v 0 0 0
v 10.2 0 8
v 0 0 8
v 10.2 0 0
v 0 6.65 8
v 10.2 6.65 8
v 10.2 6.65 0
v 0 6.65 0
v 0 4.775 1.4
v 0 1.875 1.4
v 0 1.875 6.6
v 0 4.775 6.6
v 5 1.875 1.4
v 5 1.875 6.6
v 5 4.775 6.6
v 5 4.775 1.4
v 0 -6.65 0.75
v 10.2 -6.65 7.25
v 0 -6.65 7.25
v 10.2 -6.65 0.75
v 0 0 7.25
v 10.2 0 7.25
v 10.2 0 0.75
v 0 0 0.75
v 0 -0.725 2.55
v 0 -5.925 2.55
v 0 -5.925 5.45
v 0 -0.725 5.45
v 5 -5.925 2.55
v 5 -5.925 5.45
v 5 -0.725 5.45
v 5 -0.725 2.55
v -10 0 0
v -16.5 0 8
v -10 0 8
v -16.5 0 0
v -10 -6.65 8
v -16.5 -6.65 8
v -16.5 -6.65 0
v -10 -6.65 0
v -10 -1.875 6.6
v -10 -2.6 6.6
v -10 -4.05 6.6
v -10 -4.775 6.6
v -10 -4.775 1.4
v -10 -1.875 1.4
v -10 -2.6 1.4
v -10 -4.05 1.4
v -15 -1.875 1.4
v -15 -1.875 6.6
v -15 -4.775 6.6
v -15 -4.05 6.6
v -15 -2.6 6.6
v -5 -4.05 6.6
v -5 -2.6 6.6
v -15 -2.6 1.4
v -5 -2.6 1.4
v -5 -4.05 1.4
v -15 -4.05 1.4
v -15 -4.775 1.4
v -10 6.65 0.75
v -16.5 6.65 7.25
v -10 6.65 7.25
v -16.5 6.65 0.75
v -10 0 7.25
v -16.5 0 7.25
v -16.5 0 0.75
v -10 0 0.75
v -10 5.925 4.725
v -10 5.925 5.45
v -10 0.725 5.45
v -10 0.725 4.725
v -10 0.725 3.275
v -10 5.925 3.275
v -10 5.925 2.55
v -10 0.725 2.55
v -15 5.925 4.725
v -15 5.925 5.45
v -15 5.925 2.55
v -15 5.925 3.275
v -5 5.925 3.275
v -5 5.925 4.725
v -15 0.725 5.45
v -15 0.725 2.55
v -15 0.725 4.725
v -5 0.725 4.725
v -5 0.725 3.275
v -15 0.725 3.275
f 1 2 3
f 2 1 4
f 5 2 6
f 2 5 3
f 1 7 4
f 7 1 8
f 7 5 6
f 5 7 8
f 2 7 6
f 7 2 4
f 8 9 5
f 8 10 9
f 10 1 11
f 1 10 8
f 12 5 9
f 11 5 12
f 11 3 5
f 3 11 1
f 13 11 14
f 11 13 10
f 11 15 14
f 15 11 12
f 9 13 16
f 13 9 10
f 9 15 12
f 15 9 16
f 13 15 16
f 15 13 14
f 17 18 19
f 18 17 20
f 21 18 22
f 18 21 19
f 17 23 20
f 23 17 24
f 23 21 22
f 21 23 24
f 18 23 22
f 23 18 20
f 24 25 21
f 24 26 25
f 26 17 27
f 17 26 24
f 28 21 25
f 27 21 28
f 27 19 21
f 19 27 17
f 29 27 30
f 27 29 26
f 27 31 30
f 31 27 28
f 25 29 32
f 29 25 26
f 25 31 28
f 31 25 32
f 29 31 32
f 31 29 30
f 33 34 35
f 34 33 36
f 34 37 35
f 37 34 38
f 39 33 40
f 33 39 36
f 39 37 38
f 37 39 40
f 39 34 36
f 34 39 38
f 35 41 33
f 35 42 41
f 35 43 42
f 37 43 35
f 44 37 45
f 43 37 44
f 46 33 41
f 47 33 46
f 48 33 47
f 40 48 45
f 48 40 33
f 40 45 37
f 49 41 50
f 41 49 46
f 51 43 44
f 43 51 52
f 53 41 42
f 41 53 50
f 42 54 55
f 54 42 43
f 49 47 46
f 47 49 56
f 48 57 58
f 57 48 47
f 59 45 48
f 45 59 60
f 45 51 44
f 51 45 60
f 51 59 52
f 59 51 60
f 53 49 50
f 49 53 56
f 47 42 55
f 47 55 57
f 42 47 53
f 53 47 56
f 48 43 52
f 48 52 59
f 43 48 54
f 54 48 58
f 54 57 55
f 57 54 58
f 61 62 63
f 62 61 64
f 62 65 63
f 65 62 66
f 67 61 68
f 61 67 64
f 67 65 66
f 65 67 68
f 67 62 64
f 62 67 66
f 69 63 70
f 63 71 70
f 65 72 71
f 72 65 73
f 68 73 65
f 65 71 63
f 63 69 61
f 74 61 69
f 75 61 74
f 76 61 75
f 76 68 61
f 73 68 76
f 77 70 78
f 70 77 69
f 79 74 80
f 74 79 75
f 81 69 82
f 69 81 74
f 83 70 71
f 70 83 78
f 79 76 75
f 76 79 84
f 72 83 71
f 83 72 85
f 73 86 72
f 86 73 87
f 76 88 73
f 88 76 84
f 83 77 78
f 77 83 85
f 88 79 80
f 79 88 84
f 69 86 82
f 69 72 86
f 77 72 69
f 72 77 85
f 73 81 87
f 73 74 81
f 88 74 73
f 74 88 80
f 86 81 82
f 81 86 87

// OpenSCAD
/**
  * Module: T-Plug placeholders
  *
  * Author: Karim Aziiev <karim.aziiev@gmail.com>
  * License: GPL-3.0-or-later
  */

include <../colors.scad>

use <../lib/shapes3d.scad>
use <../lib/transforms.scad>

t_plug_body_w         = 13.3;
t_plug_body_size      = [13.3, 10.2, 8.0, 6.5]; // width, length, plus height, minus height
t_plug_plus_body_size = [t_plug_body_w / 2, 7.6, 8.0];

t_plug_depth          = 5;

t_plug_hole_l         = 5.2;
t_plug_hole_w         = 2.9;

t_plug_male_body_l    = 6.5;

t_plug_male_body_size = [t_plug_body_size[0],
                         t_plug_male_body_l,
                         t_plug_body_size[2],
                         t_plug_body_size[3]];

module t_plug_female(body_size=t_plug_body_size,
                     color="#96484D",
                     t_plug_depth=t_plug_depth,
                     t_plug_hole_w=t_plug_hole_w,
                     t_plug_hole_l=t_plug_hole_l,
                     anchor=[0, 0, 1],
                     spin,
                     orientation="wlh") {
  w = body_size[0] / 2;
  plus_h = body_size[2];
  minus_h = body_size[3];
  plus_body_size = [w, body_size[1], plus_h];
  minus_body_size = [w, body_size[1], minus_h];

  with_orientation(from="wlh",
                   to=orientation,
                   anchor=anchor,
                   size=[body_size[0], body_size[1], max(plus_h, minus_h)],
                   spin=spin) {
    translate([0, -body_size[1] / 2, 0]) {
      translate([-plus_body_size[0] / 2, 0, plus_h / 2]) {

        difference() {
          cuboid(size=plus_body_size, anchor=[0, 1, 0], color=color);
          translate([0, -0.1, 0]) {
            cuboid(size=[t_plug_hole_w, t_plug_depth + 0.1, t_plug_hole_l],
                   anchor=[0, 1, 0]);
          }
        }
        if ($children > 0) {
          children(0);
        }
      }

      translate([minus_body_size[0] / 2, 0, plus_h / 2]) {
        difference() {
          cuboid(size=minus_body_size, anchor=[0, 1, 0], color=color);
          translate([0, -0.1, 0]) {
            cuboid(size=[t_plug_hole_l, t_plug_depth + 0.1, t_plug_hole_w],
                   anchor=[0, 1, 0]);
          }
        }
        if ($children > 1) {
          children(1);
        }
      }
    }
  }
}

module t_plug_male(body_size=t_plug_male_body_size,
                   color="#96484D",
                   t_plug_depth=t_plug_depth,
                   t_plug_hole_w=t_plug_hole_w,
                   t_plug_hole_l=t_plug_hole_l,
                   anchor=[0, 0, 1],
                   spin,
                   orientation="wlh") {
  t_plug_female(orientation=orientation,
                body_size=body_size,
                spin=spin,
                anchor=anchor,
                color=color,
                t_plug_depth=t_plug_depth,
                t_plug_hole_w=t_plug_hole_w,
                t_plug_hole_l=t_plug_hole_l) {
    cuboid(size=[t_plug_hole_w / 2, t_plug_depth * 2, t_plug_hole_l],
           anchor=[0, 0, 0],
           color=metallic_gold_2);
    cuboid(size=[t_plug_hole_l, t_plug_depth * 2, t_plug_hole_w / 2],
           anchor=[0, 0, 0],
           color=metallic_gold_2);
  }
}

t_plug_female(orientation="lwh", anchor=[1, 0, 1], spin=180);

translate([-10, 0, 0]) {
  t_plug_male(orientation="lwh", anchor=[-1, 0, 1]);
}
/**
  ─────────────────────────────────────────────────────────────────────────────
  t_plug_mated_props
  ─────────────────────────────────────────────────────────────────────────────
  Return mating and solder datums for the default keyed connector pair.
  **Returns:** Female body on +Y, male body on -Y, mating plane Y=0 and
  bottom Z=0. Ports are ordered positive, negative, in both halves.
 */
function t_plug_mated_props() =
  ["female_size", t_plug_body_size,
   "male_size", t_plug_male_body_size,
   "female_ports", [for (x = [-1, 1])
     [x * t_plug_body_size[0] / 4, t_plug_body_size[1], t_plug_body_size[2] / 2]],
   "male_ports", [for (x = [-1, 1])
     [x * t_plug_body_size[0] / 4, -t_plug_male_body_l, t_plug_body_size[2] / 2]]];

/**
  ─────────────────────────────────────────────────────────────────────────────
  t_plug_mated
  ─────────────────────────────────────────────────────────────────────────────
  Display a keyed, connected pair in the t_plug_mated_props frame.
  **Parameters:**
  - `show_female`: Display the battery half.
  - `show_male`: Display the harness half, including inserted contact blades.
 */
module t_plug_mated(show_female=true, show_male=true) {
  if (show_female) {
    translate([0, t_plug_body_size[1] / 2, 0]) {
      t_plug_female();
    }
  }
  if (show_male) {
    translate([0, -t_plug_male_body_l / 2, 0]) {
      mirror([0, 1, 0]) {
        t_plug_male();
      }
    }
  }
}
